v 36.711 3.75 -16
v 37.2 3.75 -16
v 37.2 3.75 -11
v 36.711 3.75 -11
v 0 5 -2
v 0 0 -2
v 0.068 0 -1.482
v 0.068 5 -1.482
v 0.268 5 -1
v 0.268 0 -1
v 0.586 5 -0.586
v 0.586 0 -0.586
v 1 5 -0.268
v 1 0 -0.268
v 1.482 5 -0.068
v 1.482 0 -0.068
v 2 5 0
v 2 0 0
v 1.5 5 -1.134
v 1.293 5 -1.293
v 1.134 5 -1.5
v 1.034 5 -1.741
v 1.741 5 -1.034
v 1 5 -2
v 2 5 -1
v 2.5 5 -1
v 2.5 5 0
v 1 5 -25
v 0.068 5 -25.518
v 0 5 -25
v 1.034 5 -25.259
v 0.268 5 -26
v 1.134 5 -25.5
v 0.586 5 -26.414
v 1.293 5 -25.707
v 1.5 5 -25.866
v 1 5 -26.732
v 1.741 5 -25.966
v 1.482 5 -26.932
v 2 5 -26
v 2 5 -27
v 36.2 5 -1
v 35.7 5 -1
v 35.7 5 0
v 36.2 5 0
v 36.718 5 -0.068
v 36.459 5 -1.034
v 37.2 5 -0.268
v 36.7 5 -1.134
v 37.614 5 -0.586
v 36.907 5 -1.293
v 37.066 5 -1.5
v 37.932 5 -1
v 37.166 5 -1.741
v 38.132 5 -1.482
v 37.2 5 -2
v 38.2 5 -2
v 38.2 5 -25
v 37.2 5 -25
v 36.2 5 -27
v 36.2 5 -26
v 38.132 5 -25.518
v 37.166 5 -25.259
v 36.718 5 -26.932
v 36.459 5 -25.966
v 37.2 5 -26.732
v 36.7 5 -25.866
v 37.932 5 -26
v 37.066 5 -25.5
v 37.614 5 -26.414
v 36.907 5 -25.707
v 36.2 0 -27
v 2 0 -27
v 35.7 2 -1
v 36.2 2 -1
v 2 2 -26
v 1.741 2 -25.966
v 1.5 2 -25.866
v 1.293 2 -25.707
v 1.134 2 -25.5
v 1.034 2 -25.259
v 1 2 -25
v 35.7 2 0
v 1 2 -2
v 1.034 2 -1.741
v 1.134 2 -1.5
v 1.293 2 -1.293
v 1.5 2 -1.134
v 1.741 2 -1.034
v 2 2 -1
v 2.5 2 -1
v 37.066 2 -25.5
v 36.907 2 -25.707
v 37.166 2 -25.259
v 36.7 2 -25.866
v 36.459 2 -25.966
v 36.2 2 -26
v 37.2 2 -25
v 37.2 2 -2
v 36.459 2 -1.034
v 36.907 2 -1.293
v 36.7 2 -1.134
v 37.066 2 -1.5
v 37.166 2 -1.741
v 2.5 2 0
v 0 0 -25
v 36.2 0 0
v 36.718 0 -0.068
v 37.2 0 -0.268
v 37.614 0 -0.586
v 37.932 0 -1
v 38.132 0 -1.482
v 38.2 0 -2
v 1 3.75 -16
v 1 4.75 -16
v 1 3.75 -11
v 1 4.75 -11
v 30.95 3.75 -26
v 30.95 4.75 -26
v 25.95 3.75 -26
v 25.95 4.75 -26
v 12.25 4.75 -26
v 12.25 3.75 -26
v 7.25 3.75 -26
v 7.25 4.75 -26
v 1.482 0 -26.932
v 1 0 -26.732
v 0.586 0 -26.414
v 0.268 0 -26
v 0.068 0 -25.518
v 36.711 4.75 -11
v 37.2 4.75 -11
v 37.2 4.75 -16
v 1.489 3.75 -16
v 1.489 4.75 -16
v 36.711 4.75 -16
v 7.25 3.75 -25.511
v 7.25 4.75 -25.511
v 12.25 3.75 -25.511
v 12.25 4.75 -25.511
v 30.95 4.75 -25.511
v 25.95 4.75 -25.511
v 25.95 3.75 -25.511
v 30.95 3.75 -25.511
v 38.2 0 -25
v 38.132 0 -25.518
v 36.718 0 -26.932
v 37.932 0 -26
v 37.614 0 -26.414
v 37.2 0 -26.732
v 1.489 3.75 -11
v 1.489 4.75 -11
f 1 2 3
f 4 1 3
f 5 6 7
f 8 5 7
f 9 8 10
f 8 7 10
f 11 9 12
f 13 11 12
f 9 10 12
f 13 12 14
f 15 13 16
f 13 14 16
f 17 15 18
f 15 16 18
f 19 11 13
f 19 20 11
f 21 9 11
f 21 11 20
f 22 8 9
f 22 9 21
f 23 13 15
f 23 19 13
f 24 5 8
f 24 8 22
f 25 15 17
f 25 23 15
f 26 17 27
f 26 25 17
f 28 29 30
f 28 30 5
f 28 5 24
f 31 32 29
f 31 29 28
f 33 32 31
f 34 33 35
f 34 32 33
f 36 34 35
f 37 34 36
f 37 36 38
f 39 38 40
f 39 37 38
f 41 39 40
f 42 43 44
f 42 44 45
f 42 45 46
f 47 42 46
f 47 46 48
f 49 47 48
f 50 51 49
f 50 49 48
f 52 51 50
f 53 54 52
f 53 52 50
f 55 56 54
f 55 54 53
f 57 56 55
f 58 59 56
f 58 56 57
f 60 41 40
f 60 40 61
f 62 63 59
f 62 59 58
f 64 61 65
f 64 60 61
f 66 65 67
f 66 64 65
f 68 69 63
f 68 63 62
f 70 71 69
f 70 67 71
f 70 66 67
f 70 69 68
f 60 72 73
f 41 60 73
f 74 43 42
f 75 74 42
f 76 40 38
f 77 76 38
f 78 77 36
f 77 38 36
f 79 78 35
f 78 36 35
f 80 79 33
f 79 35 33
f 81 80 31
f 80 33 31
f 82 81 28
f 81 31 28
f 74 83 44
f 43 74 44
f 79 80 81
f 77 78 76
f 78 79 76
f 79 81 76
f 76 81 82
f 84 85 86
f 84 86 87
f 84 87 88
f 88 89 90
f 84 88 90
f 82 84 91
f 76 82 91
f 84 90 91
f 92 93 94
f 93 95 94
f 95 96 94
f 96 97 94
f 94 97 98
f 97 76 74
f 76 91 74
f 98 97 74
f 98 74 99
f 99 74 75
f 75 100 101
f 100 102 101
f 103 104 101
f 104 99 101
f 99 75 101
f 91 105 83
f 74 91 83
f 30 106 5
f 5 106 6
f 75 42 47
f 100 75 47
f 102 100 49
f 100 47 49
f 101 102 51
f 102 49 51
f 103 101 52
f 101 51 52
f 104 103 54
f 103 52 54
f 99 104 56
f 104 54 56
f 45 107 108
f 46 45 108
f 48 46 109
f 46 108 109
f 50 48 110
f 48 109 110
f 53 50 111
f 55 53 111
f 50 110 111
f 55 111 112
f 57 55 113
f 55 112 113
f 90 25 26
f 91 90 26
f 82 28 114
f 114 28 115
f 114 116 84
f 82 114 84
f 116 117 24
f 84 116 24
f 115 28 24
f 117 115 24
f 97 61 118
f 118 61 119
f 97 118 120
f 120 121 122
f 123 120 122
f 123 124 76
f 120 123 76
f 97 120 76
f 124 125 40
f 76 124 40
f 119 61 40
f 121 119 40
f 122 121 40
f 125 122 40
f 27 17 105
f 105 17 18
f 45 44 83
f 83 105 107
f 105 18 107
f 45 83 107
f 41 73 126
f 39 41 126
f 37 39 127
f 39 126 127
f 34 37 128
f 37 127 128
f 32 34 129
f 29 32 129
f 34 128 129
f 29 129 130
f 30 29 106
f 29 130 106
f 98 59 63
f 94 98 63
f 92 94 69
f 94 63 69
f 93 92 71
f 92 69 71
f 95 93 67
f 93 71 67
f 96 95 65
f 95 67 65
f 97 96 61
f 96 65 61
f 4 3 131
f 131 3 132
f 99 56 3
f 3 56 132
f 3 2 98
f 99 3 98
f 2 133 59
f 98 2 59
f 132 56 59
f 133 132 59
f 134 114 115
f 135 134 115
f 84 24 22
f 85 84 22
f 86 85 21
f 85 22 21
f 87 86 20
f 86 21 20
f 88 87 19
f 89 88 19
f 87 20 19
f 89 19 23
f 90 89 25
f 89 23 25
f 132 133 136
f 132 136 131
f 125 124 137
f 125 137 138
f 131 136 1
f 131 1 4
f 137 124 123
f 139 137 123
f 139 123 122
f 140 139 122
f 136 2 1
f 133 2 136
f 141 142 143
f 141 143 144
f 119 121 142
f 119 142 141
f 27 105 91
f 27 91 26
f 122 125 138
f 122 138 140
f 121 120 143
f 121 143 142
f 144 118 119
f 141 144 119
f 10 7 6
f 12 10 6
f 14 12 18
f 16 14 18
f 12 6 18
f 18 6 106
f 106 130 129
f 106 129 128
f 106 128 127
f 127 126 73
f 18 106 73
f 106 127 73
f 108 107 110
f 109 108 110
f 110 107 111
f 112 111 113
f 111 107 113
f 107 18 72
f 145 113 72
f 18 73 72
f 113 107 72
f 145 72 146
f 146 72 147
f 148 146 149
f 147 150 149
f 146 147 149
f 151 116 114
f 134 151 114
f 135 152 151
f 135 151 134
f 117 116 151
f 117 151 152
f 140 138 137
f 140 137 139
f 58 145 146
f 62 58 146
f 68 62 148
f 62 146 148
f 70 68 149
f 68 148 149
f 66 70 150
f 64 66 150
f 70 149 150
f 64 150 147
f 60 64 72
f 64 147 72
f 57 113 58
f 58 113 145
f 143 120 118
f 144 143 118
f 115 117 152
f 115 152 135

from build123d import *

# Parameters (mm, degrees)
BOSS_EXTRU_1_DEPTH      = 5
ENL_V_MAT_EXTRU_1_DEPTH = 3
ESQUISSE3_W             = 33.2
ESQUISSE3_H             = 3
ENL_V_MAT_EXTRU_2_DEPTH = 3
ESQUISSE4_W             = 5
ESQUISSE4_H             = 1
BOSS_EXTRU_2_DEPTH      = 0.48904
ESQUISSE5_W             = 5
ESQUISSE5_H             = 1
BOSS_EXTRU_3_DEPTH      = 0.48904
ESQUISSE6_W             = 5
ESQUISSE6_H             = 1
BOSS_EXTRU_4_DEPTH      = 0.48904


with BuildPart() as part:
    # Esquisse1 → Boss.-Extru.1 (new body)
    with BuildSketch(Plane(origin=(0, 0, 0), x_dir=(1, 0, 0), z_dir=(0, 1, 0))):
        with BuildLine():
            Line((2, 0), (36.2, 0))
            ThreePointArc((36.2, 0), (37.614213562, 0.585786438), (38.2, 2))
            Line((38.2, 2), (38.2, 25))
            ThreePointArc((38.2, 25), (37.614213562, 26.414213562), (36.2, 27))
            Line((36.2, 27), (2, 27))
            ThreePointArc((2, 27), (0.585786438, 26.414213562), (0, 25))
            Line((0, 25), (0, 2))
            ThreePointArc((0, 2), (0.585786438, 0.585786438), (2, 0))
        make_face()
    extrude(amount=BOSS_EXTRU_1_DEPTH)

    # Esquisse2 → Enlèv. mat.-Extru.1 (cut)
    with BuildSketch(Plane(origin=(0, 5, 0), x_dir=(1, 0, 0), z_dir=(0, 1, 0))):
        with BuildLine():
            Line((37.2, 2), (37.2, 25))
            ThreePointArc((37.2, 25), (36.907106781, 25.707106781), (36.2, 26))
            Line((36.2, 26), (2, 26))
            ThreePointArc((2, 26), (1.292893219, 25.707106781), (1, 25))
            Line((1, 25), (1, 2))
            ThreePointArc((1, 2), (1.292893219, 1.292893219), (2, 1))
            Line((2, 1), (36.2, 1))
            ThreePointArc((36.2, 1), (36.907106781, 1.292893219), (37.2, 2))
        make_face()
    extrude(amount=-ENL_V_MAT_EXTRU_1_DEPTH, mode=Mode.SUBTRACT)

    # Esquisse3 → Enlèv. mat.-Extru.2 (cut)
    with BuildSketch(Plane.XY):
        with Locations((19.1, 3.5)):
            Rectangle(ESQUISSE3_W, ESQUISSE3_H)
    extrude(amount=-ENL_V_MAT_EXTRU_2_DEPTH, mode=Mode.SUBTRACT)

    # Esquisse4 → Boss.-Extru.2 (add)
    with BuildSketch(Plane(origin=(1, 0, 0), x_dir=(0, 0, -1), z_dir=(1, 0, 0))):
        with Locations((13.5, 4.25)):
            Rectangle(ESQUISSE4_W, ESQUISSE4_H)
    extrude(amount=BOSS_EXTRU_2_DEPTH)

    # Esquisse5 → Boss.-Extru.3 (add)
    with BuildSketch(Plane.ZY.offset(-37.2)):
        with Locations((-13.5, 4.25)):
            Rectangle(ESQUISSE5_W, ESQUISSE5_H)
    extrude(amount=BOSS_EXTRU_3_DEPTH)

    # Esquisse6 → Boss.-Extru.4 (add)
    with BuildSketch(Plane.XY.offset(-26)):
        with Locations((9.75, 4.25)):
            Rectangle(ESQUISSE6_W, ESQUISSE6_H)
        with Locations((28.45, 4.25)):
            Rectangle(ESQUISSE6_W, ESQUISSE6_H)
    extrude(amount=BOSS_EXTRU_4_DEPTH)


solid = part.part
